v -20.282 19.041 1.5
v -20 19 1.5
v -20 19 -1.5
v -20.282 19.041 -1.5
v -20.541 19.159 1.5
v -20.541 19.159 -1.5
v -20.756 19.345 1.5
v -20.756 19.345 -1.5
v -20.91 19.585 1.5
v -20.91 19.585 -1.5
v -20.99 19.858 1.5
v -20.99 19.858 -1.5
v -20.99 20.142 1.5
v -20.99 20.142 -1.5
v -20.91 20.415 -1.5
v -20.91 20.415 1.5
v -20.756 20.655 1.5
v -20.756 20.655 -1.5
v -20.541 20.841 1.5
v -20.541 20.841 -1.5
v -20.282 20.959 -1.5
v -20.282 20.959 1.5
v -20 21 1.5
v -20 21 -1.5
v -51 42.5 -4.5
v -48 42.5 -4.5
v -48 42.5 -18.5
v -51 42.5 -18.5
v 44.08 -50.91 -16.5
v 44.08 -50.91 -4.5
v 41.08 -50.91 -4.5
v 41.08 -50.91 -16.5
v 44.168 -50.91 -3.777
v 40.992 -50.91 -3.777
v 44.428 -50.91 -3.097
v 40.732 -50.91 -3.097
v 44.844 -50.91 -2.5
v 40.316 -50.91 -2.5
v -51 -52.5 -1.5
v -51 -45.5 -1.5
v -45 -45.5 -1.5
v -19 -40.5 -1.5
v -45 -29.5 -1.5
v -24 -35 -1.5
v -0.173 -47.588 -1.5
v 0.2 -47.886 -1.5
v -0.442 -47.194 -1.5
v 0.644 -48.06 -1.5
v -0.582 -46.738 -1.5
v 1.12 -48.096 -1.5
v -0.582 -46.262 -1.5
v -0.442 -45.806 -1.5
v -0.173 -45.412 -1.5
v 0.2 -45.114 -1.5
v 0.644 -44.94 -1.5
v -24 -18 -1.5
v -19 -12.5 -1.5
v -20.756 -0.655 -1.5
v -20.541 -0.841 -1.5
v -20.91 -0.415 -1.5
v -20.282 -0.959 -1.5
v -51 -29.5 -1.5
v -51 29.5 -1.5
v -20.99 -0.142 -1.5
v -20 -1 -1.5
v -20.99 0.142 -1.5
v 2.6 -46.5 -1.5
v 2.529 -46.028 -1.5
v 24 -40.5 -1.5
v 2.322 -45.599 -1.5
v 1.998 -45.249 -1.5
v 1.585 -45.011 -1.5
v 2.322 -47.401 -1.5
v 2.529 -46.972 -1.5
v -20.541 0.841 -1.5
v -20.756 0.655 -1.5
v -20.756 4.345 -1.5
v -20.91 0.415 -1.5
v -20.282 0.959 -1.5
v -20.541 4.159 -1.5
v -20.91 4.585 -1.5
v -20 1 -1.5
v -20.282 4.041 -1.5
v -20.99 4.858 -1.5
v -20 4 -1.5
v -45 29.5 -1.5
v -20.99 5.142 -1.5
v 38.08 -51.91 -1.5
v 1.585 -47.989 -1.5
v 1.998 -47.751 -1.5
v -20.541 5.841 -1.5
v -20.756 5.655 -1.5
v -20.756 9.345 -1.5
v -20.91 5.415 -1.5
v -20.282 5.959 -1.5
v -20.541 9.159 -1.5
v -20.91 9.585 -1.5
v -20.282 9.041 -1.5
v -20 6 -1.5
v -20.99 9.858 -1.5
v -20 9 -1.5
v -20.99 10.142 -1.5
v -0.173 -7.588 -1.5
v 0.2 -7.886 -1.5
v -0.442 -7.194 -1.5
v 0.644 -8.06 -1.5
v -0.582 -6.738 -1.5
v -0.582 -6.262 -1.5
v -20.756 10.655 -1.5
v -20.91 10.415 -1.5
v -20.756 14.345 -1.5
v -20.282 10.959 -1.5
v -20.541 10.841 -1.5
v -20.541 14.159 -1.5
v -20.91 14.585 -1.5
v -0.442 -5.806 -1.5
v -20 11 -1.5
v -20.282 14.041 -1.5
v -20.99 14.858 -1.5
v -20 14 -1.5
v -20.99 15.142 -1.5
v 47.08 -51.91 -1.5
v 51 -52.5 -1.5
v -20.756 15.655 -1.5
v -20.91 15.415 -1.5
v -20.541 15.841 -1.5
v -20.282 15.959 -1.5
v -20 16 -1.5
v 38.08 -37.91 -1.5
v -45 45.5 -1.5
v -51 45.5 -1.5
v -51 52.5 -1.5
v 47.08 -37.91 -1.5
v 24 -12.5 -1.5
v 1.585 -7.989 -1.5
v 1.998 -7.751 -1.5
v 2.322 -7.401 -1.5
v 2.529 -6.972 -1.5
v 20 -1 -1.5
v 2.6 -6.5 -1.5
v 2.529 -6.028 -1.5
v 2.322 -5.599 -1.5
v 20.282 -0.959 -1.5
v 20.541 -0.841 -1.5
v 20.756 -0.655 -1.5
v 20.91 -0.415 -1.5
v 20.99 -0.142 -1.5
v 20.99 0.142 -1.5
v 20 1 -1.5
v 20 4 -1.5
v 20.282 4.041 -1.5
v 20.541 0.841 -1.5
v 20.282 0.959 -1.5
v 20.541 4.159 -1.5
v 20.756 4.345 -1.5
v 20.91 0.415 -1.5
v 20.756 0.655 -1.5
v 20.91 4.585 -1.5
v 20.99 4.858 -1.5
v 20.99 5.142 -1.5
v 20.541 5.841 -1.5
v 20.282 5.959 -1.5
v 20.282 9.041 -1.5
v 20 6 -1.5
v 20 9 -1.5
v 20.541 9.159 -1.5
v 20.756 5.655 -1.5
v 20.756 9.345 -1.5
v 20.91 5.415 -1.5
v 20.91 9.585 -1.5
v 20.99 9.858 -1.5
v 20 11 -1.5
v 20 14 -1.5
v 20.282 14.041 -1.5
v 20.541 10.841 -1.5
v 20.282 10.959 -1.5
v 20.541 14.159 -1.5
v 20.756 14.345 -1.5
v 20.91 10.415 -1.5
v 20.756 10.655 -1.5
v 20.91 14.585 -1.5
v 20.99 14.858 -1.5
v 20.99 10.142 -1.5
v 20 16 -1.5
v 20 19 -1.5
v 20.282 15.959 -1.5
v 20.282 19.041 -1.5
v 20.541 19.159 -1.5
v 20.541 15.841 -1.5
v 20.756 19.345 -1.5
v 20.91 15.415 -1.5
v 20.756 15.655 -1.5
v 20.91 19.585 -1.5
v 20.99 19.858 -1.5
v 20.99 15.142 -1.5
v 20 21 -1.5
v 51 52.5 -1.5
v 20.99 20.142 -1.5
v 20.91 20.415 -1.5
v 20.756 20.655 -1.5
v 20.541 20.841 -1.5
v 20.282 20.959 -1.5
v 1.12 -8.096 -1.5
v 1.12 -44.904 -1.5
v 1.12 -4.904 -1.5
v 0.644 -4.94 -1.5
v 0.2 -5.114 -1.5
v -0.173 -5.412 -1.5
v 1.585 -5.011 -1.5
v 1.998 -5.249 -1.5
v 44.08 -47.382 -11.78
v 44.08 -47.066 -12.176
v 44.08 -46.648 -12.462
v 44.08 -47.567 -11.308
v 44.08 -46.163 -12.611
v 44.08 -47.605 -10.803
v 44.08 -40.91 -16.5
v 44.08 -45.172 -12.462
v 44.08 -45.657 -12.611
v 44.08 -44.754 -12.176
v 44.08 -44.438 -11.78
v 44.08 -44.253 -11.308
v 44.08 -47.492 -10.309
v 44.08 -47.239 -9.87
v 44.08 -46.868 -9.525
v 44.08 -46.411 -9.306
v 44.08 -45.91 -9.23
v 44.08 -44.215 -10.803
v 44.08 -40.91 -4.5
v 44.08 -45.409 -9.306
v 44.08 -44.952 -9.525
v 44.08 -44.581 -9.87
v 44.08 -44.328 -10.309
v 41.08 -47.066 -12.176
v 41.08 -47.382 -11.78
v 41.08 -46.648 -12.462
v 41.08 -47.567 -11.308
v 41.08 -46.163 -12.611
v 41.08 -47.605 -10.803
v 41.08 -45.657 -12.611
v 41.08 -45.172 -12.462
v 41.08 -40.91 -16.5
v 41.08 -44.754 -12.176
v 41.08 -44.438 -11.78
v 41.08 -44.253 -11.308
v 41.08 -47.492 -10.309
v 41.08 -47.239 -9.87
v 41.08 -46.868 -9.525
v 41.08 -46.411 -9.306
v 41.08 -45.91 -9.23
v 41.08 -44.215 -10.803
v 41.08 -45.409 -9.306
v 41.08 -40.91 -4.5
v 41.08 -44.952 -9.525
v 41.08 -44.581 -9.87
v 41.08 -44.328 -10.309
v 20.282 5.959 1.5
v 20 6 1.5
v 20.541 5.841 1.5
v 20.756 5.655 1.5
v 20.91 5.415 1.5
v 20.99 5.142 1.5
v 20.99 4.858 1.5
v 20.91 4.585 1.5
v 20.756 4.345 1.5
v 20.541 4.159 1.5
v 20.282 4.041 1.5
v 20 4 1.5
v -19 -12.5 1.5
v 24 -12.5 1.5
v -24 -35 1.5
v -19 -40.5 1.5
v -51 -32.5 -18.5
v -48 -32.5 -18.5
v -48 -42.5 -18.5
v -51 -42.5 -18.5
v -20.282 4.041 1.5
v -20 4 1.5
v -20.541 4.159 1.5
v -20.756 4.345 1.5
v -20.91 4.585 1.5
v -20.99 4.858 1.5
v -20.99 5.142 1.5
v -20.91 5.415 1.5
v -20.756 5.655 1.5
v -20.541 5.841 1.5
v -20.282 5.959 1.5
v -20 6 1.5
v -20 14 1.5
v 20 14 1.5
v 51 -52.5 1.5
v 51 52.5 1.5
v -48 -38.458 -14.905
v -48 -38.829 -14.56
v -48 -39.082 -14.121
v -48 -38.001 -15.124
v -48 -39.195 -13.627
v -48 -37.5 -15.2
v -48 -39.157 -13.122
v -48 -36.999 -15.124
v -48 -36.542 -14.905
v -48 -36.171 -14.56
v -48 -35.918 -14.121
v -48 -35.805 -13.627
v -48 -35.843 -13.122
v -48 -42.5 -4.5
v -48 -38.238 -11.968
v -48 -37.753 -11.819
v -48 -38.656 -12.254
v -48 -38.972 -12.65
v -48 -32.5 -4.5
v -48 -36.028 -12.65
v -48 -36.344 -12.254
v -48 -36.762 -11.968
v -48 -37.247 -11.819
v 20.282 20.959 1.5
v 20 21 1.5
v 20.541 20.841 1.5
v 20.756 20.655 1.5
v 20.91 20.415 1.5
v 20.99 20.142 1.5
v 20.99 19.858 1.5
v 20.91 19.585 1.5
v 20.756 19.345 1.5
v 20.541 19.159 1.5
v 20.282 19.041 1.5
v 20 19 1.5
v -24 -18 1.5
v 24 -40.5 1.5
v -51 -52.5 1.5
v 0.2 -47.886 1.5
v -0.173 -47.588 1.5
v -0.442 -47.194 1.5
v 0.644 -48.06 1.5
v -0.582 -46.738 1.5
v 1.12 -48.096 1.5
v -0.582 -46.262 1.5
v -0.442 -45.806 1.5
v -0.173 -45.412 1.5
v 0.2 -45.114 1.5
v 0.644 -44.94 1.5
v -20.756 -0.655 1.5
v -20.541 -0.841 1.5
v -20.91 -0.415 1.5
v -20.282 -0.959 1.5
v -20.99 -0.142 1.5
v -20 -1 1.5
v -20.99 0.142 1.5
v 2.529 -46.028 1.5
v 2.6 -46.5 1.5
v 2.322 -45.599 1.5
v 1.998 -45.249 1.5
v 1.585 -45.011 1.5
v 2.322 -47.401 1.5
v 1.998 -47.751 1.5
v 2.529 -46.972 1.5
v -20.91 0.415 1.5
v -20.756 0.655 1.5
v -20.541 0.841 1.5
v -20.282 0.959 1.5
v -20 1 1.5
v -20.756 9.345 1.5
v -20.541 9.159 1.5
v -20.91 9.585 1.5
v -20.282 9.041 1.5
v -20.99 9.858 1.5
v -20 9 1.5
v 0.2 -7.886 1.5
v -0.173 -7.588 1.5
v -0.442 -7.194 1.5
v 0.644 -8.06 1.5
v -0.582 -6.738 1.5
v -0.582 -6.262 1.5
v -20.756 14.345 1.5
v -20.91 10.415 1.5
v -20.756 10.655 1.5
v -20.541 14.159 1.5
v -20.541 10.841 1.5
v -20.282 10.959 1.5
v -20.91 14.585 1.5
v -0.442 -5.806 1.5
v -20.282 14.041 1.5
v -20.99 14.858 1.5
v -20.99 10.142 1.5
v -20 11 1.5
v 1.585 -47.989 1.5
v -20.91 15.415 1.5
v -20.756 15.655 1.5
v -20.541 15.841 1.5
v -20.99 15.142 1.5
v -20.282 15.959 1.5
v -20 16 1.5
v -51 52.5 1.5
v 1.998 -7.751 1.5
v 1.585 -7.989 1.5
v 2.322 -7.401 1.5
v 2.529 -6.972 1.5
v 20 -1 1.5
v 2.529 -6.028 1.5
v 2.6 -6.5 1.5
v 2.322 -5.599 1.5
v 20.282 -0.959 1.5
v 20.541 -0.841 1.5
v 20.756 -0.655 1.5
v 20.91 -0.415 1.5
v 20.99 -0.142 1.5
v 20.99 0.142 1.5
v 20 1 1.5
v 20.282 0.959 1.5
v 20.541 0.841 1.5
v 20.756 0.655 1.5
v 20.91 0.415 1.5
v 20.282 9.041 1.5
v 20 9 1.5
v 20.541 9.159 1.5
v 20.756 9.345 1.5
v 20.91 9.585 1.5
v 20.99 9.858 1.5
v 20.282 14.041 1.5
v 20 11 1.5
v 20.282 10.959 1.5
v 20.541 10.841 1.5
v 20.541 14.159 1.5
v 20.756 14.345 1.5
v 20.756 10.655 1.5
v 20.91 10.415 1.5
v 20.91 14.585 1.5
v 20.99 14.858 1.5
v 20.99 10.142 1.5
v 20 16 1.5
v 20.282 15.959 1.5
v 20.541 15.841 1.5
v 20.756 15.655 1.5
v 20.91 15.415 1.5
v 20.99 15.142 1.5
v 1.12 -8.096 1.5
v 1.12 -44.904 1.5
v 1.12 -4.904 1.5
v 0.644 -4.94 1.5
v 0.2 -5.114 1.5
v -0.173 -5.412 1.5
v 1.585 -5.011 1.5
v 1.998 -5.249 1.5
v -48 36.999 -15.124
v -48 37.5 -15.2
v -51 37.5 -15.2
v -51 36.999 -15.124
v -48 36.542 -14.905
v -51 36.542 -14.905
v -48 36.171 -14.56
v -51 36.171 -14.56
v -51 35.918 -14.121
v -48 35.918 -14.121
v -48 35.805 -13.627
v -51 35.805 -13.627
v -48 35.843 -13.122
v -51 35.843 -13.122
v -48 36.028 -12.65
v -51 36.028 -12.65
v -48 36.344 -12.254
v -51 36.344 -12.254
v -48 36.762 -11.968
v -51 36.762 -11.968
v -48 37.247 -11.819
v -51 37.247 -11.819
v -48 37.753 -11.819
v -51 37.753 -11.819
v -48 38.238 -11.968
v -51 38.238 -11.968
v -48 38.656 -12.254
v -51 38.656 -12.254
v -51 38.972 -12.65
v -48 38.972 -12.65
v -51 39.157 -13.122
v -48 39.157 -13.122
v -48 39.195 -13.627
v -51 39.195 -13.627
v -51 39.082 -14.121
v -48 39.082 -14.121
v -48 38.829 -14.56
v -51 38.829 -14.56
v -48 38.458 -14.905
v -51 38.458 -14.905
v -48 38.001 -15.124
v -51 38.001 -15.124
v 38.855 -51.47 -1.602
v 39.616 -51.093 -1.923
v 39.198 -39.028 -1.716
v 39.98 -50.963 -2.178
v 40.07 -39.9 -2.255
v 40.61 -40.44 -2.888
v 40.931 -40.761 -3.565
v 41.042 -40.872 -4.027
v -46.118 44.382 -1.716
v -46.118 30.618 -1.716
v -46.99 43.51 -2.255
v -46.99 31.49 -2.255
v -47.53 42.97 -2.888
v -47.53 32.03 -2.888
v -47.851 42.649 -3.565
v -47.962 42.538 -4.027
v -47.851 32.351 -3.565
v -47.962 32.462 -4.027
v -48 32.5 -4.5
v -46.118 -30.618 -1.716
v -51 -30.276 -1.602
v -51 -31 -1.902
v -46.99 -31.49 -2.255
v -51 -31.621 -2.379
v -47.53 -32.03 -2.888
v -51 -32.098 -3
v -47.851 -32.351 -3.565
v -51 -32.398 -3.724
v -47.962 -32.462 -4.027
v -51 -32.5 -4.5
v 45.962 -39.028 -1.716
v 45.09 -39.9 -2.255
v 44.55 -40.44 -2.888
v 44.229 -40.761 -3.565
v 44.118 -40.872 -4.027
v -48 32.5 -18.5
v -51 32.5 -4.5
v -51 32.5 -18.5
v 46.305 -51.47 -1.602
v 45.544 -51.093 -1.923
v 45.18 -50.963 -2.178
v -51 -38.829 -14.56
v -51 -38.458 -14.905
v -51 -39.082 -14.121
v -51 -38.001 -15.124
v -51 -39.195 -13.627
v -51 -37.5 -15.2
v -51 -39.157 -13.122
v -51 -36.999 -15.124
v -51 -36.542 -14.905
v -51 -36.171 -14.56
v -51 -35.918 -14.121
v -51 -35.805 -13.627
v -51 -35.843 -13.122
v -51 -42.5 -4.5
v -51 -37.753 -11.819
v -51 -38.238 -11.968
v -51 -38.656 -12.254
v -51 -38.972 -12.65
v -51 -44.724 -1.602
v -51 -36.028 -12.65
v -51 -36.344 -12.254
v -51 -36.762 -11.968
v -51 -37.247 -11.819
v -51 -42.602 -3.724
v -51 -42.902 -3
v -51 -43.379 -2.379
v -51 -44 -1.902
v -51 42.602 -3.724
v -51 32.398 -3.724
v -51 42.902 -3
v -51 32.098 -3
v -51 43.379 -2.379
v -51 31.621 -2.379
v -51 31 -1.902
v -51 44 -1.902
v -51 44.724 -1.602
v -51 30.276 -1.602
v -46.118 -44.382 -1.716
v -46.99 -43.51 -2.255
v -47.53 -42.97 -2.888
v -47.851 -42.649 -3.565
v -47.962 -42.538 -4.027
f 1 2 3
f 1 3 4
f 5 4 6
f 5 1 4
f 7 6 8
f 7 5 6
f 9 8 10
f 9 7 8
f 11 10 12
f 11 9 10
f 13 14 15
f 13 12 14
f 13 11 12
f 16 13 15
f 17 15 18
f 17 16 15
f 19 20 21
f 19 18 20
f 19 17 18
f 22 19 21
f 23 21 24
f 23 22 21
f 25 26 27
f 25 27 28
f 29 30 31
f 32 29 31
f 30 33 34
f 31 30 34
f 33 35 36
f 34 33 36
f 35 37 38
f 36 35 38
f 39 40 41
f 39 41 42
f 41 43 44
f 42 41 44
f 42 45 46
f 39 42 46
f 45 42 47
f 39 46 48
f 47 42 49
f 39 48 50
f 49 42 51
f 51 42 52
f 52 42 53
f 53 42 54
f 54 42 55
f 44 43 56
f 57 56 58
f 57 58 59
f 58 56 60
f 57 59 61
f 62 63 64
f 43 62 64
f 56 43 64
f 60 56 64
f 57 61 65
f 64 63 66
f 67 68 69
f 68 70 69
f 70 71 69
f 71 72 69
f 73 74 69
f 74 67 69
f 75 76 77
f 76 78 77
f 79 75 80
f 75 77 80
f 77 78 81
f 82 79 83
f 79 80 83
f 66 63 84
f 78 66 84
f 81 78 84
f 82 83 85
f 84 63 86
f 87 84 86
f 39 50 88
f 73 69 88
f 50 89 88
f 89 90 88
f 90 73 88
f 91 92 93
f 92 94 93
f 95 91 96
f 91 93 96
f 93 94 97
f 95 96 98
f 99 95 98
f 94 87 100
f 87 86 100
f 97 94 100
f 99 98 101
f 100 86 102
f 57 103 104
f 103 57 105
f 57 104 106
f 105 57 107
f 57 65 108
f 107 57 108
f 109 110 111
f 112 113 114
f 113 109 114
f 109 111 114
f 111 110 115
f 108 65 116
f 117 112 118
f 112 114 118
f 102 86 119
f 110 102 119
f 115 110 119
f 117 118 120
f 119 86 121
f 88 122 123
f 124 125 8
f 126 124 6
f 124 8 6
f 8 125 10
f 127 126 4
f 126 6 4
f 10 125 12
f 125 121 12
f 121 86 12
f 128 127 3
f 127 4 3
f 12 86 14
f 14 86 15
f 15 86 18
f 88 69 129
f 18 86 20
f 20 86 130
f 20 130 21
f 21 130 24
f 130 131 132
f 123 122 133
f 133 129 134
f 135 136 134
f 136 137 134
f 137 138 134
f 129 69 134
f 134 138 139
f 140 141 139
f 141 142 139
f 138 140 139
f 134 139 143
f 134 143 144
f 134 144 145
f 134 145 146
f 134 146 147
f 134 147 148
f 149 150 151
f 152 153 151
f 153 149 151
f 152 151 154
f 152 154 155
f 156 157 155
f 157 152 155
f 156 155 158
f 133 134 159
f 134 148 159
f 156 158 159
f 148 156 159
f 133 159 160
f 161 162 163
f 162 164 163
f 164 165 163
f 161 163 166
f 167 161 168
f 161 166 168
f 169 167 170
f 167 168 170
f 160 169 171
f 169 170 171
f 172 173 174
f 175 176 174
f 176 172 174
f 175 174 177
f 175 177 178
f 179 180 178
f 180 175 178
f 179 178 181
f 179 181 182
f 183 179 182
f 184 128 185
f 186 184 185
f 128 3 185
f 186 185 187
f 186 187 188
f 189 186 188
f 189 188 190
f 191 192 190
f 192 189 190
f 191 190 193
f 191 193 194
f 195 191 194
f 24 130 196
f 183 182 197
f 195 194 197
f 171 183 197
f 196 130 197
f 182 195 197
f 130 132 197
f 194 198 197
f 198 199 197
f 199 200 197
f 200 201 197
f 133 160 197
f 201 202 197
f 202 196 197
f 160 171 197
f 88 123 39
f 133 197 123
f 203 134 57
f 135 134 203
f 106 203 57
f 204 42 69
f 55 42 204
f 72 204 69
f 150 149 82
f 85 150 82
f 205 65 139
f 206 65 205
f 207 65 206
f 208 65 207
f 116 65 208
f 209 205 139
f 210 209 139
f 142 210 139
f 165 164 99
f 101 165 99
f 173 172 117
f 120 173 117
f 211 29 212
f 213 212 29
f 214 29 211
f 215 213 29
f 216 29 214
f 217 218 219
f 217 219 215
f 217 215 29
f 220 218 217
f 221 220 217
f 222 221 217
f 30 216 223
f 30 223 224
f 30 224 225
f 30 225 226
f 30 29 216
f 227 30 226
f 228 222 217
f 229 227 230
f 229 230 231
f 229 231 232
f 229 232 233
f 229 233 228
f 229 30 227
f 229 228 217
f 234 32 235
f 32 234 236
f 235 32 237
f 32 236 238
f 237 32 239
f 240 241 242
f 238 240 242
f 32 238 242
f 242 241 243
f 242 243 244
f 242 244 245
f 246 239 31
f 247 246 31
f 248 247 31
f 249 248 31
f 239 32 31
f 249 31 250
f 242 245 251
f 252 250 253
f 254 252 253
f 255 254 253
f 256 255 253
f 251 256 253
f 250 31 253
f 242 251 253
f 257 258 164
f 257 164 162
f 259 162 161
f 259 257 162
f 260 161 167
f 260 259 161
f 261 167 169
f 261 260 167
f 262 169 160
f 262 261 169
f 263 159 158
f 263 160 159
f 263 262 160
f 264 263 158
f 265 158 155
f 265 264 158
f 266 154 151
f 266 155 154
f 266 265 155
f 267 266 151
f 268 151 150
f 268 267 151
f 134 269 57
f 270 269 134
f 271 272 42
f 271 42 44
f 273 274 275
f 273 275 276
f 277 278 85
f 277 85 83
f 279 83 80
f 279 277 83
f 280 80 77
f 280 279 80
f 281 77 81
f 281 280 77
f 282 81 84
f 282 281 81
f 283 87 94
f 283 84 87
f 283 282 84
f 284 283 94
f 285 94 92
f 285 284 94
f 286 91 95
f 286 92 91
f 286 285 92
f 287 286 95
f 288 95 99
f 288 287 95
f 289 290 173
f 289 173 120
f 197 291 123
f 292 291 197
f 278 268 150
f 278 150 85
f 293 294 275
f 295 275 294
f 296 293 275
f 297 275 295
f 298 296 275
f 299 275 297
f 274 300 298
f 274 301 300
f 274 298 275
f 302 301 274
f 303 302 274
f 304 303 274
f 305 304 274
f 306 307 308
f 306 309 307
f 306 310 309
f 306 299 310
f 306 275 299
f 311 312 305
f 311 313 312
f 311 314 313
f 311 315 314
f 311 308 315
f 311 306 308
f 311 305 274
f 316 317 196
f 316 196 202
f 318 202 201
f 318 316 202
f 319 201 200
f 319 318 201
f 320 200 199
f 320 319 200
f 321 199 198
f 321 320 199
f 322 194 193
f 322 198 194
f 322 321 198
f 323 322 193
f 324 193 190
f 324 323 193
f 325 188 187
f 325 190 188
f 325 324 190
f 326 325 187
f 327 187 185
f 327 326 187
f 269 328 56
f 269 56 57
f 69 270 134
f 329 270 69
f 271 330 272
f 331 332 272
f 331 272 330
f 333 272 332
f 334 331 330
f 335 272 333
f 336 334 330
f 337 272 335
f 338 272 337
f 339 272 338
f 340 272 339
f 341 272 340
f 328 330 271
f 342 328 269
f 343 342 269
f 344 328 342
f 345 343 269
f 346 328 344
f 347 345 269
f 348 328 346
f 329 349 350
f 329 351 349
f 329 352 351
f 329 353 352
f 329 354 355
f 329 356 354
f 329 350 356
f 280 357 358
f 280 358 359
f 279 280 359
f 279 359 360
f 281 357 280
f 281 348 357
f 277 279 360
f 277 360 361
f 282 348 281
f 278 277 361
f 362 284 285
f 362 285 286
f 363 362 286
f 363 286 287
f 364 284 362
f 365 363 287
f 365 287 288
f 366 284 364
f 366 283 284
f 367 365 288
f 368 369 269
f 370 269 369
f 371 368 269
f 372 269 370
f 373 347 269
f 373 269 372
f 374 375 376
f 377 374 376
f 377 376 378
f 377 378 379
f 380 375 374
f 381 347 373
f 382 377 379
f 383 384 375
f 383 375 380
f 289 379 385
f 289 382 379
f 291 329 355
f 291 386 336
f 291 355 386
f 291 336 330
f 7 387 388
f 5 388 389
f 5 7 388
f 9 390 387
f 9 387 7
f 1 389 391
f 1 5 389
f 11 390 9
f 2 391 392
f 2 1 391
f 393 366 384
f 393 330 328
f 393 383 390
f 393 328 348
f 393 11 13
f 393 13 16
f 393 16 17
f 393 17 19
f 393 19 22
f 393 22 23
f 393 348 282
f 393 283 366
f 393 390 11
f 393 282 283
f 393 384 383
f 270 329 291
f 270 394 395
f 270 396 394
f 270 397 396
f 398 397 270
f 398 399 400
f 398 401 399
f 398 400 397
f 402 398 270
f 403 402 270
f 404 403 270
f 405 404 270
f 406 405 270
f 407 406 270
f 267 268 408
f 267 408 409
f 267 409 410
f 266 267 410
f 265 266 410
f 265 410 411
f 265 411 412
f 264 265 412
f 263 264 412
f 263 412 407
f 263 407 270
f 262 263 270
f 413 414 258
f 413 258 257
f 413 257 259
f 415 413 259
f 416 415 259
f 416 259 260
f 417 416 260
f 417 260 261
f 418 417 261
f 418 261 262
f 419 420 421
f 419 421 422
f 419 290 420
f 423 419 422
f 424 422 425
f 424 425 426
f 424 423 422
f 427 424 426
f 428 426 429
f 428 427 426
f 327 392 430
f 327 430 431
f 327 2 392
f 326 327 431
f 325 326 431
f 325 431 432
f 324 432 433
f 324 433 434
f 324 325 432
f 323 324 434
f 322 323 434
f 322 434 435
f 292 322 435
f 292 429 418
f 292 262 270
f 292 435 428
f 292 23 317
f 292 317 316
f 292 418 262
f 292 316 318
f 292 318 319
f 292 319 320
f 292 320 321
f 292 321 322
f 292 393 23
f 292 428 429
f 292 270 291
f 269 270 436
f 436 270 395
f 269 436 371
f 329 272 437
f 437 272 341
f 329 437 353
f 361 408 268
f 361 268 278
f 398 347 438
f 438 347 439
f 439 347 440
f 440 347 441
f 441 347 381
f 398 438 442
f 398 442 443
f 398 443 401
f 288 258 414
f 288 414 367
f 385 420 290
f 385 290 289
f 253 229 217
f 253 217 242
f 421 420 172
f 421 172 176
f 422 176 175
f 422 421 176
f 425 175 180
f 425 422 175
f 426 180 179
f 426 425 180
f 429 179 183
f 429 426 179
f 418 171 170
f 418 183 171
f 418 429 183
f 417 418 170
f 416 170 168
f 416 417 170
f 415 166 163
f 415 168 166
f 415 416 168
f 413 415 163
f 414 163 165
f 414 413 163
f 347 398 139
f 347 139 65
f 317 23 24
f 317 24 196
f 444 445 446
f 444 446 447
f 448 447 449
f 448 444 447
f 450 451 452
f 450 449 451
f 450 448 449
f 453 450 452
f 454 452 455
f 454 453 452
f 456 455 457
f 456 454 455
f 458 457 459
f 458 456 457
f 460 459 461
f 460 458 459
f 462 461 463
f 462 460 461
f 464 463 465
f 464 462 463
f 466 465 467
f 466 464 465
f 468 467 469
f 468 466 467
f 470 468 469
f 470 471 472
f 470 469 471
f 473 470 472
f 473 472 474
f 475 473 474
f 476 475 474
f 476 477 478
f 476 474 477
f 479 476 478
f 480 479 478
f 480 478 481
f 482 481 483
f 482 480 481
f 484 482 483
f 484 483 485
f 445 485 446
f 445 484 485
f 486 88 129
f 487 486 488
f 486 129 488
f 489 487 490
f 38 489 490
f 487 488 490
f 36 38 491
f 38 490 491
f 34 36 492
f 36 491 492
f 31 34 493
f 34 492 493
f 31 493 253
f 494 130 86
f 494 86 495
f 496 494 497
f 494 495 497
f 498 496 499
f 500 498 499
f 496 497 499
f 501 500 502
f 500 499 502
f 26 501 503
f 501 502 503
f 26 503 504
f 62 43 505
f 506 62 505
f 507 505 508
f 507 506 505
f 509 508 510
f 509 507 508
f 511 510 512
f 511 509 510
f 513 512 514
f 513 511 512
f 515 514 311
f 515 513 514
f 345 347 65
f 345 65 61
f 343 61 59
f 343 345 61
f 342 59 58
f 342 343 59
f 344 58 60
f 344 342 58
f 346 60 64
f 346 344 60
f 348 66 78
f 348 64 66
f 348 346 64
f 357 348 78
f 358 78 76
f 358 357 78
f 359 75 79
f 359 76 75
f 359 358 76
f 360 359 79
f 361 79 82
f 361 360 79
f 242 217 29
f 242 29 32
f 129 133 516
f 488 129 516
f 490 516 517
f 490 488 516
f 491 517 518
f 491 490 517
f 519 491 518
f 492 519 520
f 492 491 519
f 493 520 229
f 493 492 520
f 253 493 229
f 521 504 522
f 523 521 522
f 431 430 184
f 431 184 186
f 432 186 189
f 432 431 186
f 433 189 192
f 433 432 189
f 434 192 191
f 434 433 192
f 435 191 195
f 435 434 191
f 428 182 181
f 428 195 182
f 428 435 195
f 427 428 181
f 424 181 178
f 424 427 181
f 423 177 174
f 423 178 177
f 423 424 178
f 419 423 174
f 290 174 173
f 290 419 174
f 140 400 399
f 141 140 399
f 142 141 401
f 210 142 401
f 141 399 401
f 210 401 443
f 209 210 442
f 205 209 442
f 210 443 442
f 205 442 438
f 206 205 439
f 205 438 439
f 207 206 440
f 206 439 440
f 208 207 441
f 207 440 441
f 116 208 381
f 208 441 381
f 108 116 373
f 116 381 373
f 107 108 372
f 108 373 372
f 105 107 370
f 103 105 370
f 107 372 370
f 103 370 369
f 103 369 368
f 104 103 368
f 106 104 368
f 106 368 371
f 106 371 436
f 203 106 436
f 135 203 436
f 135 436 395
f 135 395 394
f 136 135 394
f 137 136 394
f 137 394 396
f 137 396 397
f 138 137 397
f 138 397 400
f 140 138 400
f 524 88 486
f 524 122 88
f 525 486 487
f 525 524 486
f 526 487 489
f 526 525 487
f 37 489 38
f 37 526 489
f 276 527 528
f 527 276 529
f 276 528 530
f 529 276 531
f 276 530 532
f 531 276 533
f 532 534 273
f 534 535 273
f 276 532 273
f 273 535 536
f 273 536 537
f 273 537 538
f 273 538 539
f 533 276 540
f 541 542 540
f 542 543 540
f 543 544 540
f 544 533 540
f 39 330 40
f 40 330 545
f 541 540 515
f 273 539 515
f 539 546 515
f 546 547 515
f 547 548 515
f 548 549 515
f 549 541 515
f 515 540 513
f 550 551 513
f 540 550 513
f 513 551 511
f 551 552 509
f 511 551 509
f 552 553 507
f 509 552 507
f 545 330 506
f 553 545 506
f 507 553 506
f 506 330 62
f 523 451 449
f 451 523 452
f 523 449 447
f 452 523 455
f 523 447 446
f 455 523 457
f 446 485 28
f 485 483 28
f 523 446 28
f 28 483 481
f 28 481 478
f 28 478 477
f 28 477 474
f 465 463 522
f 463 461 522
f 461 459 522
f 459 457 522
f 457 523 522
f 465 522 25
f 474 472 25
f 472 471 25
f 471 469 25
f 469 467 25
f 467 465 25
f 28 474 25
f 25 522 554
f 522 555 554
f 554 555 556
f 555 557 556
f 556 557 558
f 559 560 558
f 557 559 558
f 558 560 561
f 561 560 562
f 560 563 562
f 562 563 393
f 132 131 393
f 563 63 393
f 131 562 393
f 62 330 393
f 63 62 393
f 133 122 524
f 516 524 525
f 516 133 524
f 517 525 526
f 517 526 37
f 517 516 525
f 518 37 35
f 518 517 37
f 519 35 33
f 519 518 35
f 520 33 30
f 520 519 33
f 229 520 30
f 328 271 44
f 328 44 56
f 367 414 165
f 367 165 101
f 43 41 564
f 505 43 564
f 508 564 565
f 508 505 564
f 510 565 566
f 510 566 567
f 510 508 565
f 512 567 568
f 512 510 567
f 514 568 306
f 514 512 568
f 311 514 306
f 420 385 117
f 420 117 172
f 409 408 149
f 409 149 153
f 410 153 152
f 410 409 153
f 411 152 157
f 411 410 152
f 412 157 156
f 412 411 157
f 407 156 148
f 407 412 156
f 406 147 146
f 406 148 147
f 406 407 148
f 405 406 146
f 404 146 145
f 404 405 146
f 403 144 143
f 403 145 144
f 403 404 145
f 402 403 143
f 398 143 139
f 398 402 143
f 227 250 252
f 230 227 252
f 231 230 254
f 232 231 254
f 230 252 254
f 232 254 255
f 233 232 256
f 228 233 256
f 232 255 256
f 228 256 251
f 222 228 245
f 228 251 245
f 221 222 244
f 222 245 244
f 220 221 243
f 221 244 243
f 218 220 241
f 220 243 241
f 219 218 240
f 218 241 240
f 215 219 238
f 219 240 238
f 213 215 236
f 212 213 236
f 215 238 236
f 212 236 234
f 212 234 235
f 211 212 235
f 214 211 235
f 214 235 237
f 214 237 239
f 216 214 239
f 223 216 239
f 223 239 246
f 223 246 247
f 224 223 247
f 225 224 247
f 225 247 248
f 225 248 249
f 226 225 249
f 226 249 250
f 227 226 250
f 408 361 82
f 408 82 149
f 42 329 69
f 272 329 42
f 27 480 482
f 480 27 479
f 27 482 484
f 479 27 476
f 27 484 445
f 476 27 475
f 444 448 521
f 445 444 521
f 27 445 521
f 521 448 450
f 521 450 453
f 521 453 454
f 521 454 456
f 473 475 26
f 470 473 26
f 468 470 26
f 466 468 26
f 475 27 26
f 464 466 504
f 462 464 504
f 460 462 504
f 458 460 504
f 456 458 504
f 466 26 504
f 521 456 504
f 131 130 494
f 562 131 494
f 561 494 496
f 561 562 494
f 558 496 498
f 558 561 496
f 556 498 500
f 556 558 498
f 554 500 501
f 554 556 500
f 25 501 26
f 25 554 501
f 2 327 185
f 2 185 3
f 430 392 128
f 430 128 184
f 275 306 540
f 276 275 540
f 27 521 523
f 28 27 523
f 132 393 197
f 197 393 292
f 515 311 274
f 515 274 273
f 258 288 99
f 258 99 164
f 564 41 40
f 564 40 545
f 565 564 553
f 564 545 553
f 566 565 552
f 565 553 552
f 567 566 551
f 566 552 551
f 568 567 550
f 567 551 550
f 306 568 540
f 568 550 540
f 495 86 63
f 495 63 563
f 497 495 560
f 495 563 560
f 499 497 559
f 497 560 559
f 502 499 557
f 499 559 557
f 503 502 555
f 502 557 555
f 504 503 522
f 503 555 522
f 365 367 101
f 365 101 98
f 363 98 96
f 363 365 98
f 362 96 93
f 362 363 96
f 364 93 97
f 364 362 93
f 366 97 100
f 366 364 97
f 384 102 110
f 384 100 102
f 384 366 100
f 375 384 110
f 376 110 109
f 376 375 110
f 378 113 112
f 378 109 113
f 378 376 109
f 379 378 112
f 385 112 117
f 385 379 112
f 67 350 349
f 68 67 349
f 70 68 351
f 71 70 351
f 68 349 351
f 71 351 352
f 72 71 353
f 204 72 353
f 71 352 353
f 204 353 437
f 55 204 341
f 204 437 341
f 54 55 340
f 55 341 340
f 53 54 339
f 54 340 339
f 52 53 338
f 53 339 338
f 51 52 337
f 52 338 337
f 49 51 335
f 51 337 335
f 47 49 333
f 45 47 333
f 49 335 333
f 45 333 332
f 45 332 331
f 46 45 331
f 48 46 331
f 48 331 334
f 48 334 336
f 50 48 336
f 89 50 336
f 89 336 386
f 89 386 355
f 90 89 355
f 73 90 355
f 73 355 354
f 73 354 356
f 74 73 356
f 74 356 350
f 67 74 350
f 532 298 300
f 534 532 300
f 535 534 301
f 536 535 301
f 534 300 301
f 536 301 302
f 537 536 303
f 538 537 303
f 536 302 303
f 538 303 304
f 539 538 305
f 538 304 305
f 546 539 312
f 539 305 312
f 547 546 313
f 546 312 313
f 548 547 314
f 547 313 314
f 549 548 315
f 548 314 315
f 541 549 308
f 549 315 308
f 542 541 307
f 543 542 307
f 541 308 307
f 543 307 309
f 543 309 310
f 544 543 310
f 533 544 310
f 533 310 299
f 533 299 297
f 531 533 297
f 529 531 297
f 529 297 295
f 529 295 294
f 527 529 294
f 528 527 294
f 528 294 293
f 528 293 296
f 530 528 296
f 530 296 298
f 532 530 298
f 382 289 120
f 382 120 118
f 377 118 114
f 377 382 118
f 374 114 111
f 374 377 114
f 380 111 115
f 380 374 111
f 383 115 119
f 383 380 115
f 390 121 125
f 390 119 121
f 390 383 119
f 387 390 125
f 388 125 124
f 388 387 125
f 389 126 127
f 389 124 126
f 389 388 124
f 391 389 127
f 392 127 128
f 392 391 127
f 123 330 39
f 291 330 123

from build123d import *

# Parameters (mm, degrees)
SKETCH2_W            = 102
SKETCH2_H            = 105
BOSS_EXTRUDE1_DEPTH  = 1.5
CUT_EXTRUDE1_DEPTH   = 10
CUT_EXTRUDE2_DEPTH   = 10
SKETCH5_W            = 3
SKETCH5_H            = 10
BOSS_EXTRUDE2_DEPTH  = 17
FILLET1_R            = 3
M3_CLEARANCE_HOLE1_D = 3.4
SKETCH8_W            = 3
SKETCH8_H            = 10
BOSS_EXTRUDE3_DEPTH  = 15
M3_CLEARANCE_HOLE2_D = 3.4
FILLET2_R            = 3
FILLET3_R            = 1
FILLET1_OF_MIRROR1_R = 3
M3_CLEARANCE_HOLE3_D = 3.2


with BuildPart() as part:
    # Sketch2 → Boss-Extrude1 (new, symmetric)
    with BuildSketch(Plane.XY):
        Rectangle(SKETCH2_W, SKETCH2_H)
    extrude(amount=BOSS_EXTRUDE1_DEPTH, both=True)

    # Sketch3 → Cut-Extrude1 (cut)
    with BuildSketch(Plane.XY.offset(1.5)):
        with BuildLine():
            Line((-20, 1), (20, 1))
            ThreePointArc((20, 1), (21, 0), (20, -1))
            Line((20, -1), (-20, -1))
            ThreePointArc((-20, -1), (-21, 0), (-20, 1))
        make_face()
        with BuildLine():
            Line((-20, 6), (20, 6))
            ThreePointArc((20, 6), (21, 5), (20, 4))
            Line((20, 4), (-20, 4))
            ThreePointArc((-20, 4), (-21, 5), (-20, 6))
        make_face()
        with BuildLine():
            Line((-20, 11), (20, 11))
            ThreePointArc((20, 11), (21, 10), (20, 9))
            Line((20, 9), (-20, 9))
            ThreePointArc((-20, 9), (-21, 10), (-20, 11))
        make_face()
        with BuildLine():
            Line((-20, 16), (20, 16))
            ThreePointArc((20, 16), (21, 15), (20, 14))
            Line((20, 14), (-20, 14))
            ThreePointArc((-20, 14), (-21, 15), (-20, 16))
        make_face()
        with BuildLine():
            Line((-20, 21), (20, 21))
            ThreePointArc((20, 21), (21, 20), (20, 19))
            Line((20, 19), (-20, 19))
            ThreePointArc((-20, 19), (-21, 20), (-20, 21))
        make_face()
    extrude(amount=-CUT_EXTRUDE1_DEPTH, mode=Mode.SUBTRACT)

    # Sketch4 → Cut-Extrude2 (cut)
    with BuildSketch(Plane.XY.offset(1.5)):
        Polygon((-19, -12.5), (24, -12.5), (24, -40.5), (-19, -40.5), (-24, -35), (-24, -18), align=None)
    extrude(amount=-CUT_EXTRUDE2_DEPTH, mode=Mode.SUBTRACT)

    # Sketch5 → Boss-Extrude2 (add)
    with BuildSketch(Plane(origin=(0, 0, -1.5), x_dir=(-1, 0, 0), z_dir=(0, 0, -1))):
        with Locations((49.5, -37.5)):
            Rectangle(SKETCH5_W, SKETCH5_H)
    boss_extrude2 = extrude(amount=BOSS_EXTRUDE2_DEPTH)

    # Fillet1
    fillet1_edges = [part.edges().sort_by_distance(p)[0] for p in [
        (-49.5, -32.5, -1.5),
        (-48, -37.5, -1.5),
        (-49.5, -42.5, -1.5),
    ]]
    fillet(fillet1_edges, radius=FILLET1_R)

    # M3 Clearance Hole1 (through all)
    with Locations(Plane.ZY.offset(51)):
        with Locations((-13.5, -37.5)):
            m3_clearance_hole1 = Hole(M3_CLEARANCE_HOLE1_D / 2)

    # Sketch8 → Boss-Extrude3 (add)
    with BuildSketch(Plane(origin=(0, 0, -1.5), x_dir=(-1, 0, 0), z_dir=(0, 0, -1))):
        with Locations((-42.58, -45.91)):
            Rectangle(SKETCH8_W, SKETCH8_H)
    extrude(amount=BOSS_EXTRUDE3_DEPTH)

    # M3 Clearance Hole2 (through all)
    with Locations(Plane(origin=(44.08, 0, 0), x_dir=(0, 0, -1), z_dir=(1, 0, 0))):
        with Locations((10.93, -45.91)):
            Hole(M3_CLEARANCE_HOLE2_D / 2)

    # Fillet2
    fillet2_edges = [part.edges().sort_by_distance(p)[0] for p in [
        (41.08, -45.91, -1.5),
        (42.58, -40.91, -1.5),
        (44.08, -45.91, -1.5),
    ]]
    fillet(fillet2_edges, radius=FILLET2_R)

    # Fillet3
    fillet3_edges = [part.edges().sort_by_distance(p)[0] for p in [
        (42.58, -50.91, -1.5),
    ]]
    fillet(fillet3_edges, radius=FILLET3_R)

    # Mirror1: Boss-Extrude2, M3 Clearance Hole1 across plane
    add(boss_extrude2.mirror(Plane.ZX))
    add(m3_clearance_hole1.mirror(Plane.ZX), mode=Mode.SUBTRACT)

    # Fillet1 of Mirror1
    fillet1_of_mirror1_edges = [part.edges().sort_by_distance(p)[0] for p in [
        (-49.5, 32.5, -1.5),
        (-48, 37.5, -1.5),
        (-49.5, 42.5, -1.5),
    ]]
    fillet(fillet1_of_mirror1_edges, radius=FILLET1_OF_MIRROR1_R)

    # M3 Clearance Hole3 (through all)
    with Locations(Plane(origin=(0, 0, -1.5), x_dir=(-1, 0, 0), z_dir=(0, 0, -1))):
        with Locations((-1, -6.5), (-1, -46.5)):
            Hole(M3_CLEARANCE_HOLE3_D / 2)


solid = part.part
